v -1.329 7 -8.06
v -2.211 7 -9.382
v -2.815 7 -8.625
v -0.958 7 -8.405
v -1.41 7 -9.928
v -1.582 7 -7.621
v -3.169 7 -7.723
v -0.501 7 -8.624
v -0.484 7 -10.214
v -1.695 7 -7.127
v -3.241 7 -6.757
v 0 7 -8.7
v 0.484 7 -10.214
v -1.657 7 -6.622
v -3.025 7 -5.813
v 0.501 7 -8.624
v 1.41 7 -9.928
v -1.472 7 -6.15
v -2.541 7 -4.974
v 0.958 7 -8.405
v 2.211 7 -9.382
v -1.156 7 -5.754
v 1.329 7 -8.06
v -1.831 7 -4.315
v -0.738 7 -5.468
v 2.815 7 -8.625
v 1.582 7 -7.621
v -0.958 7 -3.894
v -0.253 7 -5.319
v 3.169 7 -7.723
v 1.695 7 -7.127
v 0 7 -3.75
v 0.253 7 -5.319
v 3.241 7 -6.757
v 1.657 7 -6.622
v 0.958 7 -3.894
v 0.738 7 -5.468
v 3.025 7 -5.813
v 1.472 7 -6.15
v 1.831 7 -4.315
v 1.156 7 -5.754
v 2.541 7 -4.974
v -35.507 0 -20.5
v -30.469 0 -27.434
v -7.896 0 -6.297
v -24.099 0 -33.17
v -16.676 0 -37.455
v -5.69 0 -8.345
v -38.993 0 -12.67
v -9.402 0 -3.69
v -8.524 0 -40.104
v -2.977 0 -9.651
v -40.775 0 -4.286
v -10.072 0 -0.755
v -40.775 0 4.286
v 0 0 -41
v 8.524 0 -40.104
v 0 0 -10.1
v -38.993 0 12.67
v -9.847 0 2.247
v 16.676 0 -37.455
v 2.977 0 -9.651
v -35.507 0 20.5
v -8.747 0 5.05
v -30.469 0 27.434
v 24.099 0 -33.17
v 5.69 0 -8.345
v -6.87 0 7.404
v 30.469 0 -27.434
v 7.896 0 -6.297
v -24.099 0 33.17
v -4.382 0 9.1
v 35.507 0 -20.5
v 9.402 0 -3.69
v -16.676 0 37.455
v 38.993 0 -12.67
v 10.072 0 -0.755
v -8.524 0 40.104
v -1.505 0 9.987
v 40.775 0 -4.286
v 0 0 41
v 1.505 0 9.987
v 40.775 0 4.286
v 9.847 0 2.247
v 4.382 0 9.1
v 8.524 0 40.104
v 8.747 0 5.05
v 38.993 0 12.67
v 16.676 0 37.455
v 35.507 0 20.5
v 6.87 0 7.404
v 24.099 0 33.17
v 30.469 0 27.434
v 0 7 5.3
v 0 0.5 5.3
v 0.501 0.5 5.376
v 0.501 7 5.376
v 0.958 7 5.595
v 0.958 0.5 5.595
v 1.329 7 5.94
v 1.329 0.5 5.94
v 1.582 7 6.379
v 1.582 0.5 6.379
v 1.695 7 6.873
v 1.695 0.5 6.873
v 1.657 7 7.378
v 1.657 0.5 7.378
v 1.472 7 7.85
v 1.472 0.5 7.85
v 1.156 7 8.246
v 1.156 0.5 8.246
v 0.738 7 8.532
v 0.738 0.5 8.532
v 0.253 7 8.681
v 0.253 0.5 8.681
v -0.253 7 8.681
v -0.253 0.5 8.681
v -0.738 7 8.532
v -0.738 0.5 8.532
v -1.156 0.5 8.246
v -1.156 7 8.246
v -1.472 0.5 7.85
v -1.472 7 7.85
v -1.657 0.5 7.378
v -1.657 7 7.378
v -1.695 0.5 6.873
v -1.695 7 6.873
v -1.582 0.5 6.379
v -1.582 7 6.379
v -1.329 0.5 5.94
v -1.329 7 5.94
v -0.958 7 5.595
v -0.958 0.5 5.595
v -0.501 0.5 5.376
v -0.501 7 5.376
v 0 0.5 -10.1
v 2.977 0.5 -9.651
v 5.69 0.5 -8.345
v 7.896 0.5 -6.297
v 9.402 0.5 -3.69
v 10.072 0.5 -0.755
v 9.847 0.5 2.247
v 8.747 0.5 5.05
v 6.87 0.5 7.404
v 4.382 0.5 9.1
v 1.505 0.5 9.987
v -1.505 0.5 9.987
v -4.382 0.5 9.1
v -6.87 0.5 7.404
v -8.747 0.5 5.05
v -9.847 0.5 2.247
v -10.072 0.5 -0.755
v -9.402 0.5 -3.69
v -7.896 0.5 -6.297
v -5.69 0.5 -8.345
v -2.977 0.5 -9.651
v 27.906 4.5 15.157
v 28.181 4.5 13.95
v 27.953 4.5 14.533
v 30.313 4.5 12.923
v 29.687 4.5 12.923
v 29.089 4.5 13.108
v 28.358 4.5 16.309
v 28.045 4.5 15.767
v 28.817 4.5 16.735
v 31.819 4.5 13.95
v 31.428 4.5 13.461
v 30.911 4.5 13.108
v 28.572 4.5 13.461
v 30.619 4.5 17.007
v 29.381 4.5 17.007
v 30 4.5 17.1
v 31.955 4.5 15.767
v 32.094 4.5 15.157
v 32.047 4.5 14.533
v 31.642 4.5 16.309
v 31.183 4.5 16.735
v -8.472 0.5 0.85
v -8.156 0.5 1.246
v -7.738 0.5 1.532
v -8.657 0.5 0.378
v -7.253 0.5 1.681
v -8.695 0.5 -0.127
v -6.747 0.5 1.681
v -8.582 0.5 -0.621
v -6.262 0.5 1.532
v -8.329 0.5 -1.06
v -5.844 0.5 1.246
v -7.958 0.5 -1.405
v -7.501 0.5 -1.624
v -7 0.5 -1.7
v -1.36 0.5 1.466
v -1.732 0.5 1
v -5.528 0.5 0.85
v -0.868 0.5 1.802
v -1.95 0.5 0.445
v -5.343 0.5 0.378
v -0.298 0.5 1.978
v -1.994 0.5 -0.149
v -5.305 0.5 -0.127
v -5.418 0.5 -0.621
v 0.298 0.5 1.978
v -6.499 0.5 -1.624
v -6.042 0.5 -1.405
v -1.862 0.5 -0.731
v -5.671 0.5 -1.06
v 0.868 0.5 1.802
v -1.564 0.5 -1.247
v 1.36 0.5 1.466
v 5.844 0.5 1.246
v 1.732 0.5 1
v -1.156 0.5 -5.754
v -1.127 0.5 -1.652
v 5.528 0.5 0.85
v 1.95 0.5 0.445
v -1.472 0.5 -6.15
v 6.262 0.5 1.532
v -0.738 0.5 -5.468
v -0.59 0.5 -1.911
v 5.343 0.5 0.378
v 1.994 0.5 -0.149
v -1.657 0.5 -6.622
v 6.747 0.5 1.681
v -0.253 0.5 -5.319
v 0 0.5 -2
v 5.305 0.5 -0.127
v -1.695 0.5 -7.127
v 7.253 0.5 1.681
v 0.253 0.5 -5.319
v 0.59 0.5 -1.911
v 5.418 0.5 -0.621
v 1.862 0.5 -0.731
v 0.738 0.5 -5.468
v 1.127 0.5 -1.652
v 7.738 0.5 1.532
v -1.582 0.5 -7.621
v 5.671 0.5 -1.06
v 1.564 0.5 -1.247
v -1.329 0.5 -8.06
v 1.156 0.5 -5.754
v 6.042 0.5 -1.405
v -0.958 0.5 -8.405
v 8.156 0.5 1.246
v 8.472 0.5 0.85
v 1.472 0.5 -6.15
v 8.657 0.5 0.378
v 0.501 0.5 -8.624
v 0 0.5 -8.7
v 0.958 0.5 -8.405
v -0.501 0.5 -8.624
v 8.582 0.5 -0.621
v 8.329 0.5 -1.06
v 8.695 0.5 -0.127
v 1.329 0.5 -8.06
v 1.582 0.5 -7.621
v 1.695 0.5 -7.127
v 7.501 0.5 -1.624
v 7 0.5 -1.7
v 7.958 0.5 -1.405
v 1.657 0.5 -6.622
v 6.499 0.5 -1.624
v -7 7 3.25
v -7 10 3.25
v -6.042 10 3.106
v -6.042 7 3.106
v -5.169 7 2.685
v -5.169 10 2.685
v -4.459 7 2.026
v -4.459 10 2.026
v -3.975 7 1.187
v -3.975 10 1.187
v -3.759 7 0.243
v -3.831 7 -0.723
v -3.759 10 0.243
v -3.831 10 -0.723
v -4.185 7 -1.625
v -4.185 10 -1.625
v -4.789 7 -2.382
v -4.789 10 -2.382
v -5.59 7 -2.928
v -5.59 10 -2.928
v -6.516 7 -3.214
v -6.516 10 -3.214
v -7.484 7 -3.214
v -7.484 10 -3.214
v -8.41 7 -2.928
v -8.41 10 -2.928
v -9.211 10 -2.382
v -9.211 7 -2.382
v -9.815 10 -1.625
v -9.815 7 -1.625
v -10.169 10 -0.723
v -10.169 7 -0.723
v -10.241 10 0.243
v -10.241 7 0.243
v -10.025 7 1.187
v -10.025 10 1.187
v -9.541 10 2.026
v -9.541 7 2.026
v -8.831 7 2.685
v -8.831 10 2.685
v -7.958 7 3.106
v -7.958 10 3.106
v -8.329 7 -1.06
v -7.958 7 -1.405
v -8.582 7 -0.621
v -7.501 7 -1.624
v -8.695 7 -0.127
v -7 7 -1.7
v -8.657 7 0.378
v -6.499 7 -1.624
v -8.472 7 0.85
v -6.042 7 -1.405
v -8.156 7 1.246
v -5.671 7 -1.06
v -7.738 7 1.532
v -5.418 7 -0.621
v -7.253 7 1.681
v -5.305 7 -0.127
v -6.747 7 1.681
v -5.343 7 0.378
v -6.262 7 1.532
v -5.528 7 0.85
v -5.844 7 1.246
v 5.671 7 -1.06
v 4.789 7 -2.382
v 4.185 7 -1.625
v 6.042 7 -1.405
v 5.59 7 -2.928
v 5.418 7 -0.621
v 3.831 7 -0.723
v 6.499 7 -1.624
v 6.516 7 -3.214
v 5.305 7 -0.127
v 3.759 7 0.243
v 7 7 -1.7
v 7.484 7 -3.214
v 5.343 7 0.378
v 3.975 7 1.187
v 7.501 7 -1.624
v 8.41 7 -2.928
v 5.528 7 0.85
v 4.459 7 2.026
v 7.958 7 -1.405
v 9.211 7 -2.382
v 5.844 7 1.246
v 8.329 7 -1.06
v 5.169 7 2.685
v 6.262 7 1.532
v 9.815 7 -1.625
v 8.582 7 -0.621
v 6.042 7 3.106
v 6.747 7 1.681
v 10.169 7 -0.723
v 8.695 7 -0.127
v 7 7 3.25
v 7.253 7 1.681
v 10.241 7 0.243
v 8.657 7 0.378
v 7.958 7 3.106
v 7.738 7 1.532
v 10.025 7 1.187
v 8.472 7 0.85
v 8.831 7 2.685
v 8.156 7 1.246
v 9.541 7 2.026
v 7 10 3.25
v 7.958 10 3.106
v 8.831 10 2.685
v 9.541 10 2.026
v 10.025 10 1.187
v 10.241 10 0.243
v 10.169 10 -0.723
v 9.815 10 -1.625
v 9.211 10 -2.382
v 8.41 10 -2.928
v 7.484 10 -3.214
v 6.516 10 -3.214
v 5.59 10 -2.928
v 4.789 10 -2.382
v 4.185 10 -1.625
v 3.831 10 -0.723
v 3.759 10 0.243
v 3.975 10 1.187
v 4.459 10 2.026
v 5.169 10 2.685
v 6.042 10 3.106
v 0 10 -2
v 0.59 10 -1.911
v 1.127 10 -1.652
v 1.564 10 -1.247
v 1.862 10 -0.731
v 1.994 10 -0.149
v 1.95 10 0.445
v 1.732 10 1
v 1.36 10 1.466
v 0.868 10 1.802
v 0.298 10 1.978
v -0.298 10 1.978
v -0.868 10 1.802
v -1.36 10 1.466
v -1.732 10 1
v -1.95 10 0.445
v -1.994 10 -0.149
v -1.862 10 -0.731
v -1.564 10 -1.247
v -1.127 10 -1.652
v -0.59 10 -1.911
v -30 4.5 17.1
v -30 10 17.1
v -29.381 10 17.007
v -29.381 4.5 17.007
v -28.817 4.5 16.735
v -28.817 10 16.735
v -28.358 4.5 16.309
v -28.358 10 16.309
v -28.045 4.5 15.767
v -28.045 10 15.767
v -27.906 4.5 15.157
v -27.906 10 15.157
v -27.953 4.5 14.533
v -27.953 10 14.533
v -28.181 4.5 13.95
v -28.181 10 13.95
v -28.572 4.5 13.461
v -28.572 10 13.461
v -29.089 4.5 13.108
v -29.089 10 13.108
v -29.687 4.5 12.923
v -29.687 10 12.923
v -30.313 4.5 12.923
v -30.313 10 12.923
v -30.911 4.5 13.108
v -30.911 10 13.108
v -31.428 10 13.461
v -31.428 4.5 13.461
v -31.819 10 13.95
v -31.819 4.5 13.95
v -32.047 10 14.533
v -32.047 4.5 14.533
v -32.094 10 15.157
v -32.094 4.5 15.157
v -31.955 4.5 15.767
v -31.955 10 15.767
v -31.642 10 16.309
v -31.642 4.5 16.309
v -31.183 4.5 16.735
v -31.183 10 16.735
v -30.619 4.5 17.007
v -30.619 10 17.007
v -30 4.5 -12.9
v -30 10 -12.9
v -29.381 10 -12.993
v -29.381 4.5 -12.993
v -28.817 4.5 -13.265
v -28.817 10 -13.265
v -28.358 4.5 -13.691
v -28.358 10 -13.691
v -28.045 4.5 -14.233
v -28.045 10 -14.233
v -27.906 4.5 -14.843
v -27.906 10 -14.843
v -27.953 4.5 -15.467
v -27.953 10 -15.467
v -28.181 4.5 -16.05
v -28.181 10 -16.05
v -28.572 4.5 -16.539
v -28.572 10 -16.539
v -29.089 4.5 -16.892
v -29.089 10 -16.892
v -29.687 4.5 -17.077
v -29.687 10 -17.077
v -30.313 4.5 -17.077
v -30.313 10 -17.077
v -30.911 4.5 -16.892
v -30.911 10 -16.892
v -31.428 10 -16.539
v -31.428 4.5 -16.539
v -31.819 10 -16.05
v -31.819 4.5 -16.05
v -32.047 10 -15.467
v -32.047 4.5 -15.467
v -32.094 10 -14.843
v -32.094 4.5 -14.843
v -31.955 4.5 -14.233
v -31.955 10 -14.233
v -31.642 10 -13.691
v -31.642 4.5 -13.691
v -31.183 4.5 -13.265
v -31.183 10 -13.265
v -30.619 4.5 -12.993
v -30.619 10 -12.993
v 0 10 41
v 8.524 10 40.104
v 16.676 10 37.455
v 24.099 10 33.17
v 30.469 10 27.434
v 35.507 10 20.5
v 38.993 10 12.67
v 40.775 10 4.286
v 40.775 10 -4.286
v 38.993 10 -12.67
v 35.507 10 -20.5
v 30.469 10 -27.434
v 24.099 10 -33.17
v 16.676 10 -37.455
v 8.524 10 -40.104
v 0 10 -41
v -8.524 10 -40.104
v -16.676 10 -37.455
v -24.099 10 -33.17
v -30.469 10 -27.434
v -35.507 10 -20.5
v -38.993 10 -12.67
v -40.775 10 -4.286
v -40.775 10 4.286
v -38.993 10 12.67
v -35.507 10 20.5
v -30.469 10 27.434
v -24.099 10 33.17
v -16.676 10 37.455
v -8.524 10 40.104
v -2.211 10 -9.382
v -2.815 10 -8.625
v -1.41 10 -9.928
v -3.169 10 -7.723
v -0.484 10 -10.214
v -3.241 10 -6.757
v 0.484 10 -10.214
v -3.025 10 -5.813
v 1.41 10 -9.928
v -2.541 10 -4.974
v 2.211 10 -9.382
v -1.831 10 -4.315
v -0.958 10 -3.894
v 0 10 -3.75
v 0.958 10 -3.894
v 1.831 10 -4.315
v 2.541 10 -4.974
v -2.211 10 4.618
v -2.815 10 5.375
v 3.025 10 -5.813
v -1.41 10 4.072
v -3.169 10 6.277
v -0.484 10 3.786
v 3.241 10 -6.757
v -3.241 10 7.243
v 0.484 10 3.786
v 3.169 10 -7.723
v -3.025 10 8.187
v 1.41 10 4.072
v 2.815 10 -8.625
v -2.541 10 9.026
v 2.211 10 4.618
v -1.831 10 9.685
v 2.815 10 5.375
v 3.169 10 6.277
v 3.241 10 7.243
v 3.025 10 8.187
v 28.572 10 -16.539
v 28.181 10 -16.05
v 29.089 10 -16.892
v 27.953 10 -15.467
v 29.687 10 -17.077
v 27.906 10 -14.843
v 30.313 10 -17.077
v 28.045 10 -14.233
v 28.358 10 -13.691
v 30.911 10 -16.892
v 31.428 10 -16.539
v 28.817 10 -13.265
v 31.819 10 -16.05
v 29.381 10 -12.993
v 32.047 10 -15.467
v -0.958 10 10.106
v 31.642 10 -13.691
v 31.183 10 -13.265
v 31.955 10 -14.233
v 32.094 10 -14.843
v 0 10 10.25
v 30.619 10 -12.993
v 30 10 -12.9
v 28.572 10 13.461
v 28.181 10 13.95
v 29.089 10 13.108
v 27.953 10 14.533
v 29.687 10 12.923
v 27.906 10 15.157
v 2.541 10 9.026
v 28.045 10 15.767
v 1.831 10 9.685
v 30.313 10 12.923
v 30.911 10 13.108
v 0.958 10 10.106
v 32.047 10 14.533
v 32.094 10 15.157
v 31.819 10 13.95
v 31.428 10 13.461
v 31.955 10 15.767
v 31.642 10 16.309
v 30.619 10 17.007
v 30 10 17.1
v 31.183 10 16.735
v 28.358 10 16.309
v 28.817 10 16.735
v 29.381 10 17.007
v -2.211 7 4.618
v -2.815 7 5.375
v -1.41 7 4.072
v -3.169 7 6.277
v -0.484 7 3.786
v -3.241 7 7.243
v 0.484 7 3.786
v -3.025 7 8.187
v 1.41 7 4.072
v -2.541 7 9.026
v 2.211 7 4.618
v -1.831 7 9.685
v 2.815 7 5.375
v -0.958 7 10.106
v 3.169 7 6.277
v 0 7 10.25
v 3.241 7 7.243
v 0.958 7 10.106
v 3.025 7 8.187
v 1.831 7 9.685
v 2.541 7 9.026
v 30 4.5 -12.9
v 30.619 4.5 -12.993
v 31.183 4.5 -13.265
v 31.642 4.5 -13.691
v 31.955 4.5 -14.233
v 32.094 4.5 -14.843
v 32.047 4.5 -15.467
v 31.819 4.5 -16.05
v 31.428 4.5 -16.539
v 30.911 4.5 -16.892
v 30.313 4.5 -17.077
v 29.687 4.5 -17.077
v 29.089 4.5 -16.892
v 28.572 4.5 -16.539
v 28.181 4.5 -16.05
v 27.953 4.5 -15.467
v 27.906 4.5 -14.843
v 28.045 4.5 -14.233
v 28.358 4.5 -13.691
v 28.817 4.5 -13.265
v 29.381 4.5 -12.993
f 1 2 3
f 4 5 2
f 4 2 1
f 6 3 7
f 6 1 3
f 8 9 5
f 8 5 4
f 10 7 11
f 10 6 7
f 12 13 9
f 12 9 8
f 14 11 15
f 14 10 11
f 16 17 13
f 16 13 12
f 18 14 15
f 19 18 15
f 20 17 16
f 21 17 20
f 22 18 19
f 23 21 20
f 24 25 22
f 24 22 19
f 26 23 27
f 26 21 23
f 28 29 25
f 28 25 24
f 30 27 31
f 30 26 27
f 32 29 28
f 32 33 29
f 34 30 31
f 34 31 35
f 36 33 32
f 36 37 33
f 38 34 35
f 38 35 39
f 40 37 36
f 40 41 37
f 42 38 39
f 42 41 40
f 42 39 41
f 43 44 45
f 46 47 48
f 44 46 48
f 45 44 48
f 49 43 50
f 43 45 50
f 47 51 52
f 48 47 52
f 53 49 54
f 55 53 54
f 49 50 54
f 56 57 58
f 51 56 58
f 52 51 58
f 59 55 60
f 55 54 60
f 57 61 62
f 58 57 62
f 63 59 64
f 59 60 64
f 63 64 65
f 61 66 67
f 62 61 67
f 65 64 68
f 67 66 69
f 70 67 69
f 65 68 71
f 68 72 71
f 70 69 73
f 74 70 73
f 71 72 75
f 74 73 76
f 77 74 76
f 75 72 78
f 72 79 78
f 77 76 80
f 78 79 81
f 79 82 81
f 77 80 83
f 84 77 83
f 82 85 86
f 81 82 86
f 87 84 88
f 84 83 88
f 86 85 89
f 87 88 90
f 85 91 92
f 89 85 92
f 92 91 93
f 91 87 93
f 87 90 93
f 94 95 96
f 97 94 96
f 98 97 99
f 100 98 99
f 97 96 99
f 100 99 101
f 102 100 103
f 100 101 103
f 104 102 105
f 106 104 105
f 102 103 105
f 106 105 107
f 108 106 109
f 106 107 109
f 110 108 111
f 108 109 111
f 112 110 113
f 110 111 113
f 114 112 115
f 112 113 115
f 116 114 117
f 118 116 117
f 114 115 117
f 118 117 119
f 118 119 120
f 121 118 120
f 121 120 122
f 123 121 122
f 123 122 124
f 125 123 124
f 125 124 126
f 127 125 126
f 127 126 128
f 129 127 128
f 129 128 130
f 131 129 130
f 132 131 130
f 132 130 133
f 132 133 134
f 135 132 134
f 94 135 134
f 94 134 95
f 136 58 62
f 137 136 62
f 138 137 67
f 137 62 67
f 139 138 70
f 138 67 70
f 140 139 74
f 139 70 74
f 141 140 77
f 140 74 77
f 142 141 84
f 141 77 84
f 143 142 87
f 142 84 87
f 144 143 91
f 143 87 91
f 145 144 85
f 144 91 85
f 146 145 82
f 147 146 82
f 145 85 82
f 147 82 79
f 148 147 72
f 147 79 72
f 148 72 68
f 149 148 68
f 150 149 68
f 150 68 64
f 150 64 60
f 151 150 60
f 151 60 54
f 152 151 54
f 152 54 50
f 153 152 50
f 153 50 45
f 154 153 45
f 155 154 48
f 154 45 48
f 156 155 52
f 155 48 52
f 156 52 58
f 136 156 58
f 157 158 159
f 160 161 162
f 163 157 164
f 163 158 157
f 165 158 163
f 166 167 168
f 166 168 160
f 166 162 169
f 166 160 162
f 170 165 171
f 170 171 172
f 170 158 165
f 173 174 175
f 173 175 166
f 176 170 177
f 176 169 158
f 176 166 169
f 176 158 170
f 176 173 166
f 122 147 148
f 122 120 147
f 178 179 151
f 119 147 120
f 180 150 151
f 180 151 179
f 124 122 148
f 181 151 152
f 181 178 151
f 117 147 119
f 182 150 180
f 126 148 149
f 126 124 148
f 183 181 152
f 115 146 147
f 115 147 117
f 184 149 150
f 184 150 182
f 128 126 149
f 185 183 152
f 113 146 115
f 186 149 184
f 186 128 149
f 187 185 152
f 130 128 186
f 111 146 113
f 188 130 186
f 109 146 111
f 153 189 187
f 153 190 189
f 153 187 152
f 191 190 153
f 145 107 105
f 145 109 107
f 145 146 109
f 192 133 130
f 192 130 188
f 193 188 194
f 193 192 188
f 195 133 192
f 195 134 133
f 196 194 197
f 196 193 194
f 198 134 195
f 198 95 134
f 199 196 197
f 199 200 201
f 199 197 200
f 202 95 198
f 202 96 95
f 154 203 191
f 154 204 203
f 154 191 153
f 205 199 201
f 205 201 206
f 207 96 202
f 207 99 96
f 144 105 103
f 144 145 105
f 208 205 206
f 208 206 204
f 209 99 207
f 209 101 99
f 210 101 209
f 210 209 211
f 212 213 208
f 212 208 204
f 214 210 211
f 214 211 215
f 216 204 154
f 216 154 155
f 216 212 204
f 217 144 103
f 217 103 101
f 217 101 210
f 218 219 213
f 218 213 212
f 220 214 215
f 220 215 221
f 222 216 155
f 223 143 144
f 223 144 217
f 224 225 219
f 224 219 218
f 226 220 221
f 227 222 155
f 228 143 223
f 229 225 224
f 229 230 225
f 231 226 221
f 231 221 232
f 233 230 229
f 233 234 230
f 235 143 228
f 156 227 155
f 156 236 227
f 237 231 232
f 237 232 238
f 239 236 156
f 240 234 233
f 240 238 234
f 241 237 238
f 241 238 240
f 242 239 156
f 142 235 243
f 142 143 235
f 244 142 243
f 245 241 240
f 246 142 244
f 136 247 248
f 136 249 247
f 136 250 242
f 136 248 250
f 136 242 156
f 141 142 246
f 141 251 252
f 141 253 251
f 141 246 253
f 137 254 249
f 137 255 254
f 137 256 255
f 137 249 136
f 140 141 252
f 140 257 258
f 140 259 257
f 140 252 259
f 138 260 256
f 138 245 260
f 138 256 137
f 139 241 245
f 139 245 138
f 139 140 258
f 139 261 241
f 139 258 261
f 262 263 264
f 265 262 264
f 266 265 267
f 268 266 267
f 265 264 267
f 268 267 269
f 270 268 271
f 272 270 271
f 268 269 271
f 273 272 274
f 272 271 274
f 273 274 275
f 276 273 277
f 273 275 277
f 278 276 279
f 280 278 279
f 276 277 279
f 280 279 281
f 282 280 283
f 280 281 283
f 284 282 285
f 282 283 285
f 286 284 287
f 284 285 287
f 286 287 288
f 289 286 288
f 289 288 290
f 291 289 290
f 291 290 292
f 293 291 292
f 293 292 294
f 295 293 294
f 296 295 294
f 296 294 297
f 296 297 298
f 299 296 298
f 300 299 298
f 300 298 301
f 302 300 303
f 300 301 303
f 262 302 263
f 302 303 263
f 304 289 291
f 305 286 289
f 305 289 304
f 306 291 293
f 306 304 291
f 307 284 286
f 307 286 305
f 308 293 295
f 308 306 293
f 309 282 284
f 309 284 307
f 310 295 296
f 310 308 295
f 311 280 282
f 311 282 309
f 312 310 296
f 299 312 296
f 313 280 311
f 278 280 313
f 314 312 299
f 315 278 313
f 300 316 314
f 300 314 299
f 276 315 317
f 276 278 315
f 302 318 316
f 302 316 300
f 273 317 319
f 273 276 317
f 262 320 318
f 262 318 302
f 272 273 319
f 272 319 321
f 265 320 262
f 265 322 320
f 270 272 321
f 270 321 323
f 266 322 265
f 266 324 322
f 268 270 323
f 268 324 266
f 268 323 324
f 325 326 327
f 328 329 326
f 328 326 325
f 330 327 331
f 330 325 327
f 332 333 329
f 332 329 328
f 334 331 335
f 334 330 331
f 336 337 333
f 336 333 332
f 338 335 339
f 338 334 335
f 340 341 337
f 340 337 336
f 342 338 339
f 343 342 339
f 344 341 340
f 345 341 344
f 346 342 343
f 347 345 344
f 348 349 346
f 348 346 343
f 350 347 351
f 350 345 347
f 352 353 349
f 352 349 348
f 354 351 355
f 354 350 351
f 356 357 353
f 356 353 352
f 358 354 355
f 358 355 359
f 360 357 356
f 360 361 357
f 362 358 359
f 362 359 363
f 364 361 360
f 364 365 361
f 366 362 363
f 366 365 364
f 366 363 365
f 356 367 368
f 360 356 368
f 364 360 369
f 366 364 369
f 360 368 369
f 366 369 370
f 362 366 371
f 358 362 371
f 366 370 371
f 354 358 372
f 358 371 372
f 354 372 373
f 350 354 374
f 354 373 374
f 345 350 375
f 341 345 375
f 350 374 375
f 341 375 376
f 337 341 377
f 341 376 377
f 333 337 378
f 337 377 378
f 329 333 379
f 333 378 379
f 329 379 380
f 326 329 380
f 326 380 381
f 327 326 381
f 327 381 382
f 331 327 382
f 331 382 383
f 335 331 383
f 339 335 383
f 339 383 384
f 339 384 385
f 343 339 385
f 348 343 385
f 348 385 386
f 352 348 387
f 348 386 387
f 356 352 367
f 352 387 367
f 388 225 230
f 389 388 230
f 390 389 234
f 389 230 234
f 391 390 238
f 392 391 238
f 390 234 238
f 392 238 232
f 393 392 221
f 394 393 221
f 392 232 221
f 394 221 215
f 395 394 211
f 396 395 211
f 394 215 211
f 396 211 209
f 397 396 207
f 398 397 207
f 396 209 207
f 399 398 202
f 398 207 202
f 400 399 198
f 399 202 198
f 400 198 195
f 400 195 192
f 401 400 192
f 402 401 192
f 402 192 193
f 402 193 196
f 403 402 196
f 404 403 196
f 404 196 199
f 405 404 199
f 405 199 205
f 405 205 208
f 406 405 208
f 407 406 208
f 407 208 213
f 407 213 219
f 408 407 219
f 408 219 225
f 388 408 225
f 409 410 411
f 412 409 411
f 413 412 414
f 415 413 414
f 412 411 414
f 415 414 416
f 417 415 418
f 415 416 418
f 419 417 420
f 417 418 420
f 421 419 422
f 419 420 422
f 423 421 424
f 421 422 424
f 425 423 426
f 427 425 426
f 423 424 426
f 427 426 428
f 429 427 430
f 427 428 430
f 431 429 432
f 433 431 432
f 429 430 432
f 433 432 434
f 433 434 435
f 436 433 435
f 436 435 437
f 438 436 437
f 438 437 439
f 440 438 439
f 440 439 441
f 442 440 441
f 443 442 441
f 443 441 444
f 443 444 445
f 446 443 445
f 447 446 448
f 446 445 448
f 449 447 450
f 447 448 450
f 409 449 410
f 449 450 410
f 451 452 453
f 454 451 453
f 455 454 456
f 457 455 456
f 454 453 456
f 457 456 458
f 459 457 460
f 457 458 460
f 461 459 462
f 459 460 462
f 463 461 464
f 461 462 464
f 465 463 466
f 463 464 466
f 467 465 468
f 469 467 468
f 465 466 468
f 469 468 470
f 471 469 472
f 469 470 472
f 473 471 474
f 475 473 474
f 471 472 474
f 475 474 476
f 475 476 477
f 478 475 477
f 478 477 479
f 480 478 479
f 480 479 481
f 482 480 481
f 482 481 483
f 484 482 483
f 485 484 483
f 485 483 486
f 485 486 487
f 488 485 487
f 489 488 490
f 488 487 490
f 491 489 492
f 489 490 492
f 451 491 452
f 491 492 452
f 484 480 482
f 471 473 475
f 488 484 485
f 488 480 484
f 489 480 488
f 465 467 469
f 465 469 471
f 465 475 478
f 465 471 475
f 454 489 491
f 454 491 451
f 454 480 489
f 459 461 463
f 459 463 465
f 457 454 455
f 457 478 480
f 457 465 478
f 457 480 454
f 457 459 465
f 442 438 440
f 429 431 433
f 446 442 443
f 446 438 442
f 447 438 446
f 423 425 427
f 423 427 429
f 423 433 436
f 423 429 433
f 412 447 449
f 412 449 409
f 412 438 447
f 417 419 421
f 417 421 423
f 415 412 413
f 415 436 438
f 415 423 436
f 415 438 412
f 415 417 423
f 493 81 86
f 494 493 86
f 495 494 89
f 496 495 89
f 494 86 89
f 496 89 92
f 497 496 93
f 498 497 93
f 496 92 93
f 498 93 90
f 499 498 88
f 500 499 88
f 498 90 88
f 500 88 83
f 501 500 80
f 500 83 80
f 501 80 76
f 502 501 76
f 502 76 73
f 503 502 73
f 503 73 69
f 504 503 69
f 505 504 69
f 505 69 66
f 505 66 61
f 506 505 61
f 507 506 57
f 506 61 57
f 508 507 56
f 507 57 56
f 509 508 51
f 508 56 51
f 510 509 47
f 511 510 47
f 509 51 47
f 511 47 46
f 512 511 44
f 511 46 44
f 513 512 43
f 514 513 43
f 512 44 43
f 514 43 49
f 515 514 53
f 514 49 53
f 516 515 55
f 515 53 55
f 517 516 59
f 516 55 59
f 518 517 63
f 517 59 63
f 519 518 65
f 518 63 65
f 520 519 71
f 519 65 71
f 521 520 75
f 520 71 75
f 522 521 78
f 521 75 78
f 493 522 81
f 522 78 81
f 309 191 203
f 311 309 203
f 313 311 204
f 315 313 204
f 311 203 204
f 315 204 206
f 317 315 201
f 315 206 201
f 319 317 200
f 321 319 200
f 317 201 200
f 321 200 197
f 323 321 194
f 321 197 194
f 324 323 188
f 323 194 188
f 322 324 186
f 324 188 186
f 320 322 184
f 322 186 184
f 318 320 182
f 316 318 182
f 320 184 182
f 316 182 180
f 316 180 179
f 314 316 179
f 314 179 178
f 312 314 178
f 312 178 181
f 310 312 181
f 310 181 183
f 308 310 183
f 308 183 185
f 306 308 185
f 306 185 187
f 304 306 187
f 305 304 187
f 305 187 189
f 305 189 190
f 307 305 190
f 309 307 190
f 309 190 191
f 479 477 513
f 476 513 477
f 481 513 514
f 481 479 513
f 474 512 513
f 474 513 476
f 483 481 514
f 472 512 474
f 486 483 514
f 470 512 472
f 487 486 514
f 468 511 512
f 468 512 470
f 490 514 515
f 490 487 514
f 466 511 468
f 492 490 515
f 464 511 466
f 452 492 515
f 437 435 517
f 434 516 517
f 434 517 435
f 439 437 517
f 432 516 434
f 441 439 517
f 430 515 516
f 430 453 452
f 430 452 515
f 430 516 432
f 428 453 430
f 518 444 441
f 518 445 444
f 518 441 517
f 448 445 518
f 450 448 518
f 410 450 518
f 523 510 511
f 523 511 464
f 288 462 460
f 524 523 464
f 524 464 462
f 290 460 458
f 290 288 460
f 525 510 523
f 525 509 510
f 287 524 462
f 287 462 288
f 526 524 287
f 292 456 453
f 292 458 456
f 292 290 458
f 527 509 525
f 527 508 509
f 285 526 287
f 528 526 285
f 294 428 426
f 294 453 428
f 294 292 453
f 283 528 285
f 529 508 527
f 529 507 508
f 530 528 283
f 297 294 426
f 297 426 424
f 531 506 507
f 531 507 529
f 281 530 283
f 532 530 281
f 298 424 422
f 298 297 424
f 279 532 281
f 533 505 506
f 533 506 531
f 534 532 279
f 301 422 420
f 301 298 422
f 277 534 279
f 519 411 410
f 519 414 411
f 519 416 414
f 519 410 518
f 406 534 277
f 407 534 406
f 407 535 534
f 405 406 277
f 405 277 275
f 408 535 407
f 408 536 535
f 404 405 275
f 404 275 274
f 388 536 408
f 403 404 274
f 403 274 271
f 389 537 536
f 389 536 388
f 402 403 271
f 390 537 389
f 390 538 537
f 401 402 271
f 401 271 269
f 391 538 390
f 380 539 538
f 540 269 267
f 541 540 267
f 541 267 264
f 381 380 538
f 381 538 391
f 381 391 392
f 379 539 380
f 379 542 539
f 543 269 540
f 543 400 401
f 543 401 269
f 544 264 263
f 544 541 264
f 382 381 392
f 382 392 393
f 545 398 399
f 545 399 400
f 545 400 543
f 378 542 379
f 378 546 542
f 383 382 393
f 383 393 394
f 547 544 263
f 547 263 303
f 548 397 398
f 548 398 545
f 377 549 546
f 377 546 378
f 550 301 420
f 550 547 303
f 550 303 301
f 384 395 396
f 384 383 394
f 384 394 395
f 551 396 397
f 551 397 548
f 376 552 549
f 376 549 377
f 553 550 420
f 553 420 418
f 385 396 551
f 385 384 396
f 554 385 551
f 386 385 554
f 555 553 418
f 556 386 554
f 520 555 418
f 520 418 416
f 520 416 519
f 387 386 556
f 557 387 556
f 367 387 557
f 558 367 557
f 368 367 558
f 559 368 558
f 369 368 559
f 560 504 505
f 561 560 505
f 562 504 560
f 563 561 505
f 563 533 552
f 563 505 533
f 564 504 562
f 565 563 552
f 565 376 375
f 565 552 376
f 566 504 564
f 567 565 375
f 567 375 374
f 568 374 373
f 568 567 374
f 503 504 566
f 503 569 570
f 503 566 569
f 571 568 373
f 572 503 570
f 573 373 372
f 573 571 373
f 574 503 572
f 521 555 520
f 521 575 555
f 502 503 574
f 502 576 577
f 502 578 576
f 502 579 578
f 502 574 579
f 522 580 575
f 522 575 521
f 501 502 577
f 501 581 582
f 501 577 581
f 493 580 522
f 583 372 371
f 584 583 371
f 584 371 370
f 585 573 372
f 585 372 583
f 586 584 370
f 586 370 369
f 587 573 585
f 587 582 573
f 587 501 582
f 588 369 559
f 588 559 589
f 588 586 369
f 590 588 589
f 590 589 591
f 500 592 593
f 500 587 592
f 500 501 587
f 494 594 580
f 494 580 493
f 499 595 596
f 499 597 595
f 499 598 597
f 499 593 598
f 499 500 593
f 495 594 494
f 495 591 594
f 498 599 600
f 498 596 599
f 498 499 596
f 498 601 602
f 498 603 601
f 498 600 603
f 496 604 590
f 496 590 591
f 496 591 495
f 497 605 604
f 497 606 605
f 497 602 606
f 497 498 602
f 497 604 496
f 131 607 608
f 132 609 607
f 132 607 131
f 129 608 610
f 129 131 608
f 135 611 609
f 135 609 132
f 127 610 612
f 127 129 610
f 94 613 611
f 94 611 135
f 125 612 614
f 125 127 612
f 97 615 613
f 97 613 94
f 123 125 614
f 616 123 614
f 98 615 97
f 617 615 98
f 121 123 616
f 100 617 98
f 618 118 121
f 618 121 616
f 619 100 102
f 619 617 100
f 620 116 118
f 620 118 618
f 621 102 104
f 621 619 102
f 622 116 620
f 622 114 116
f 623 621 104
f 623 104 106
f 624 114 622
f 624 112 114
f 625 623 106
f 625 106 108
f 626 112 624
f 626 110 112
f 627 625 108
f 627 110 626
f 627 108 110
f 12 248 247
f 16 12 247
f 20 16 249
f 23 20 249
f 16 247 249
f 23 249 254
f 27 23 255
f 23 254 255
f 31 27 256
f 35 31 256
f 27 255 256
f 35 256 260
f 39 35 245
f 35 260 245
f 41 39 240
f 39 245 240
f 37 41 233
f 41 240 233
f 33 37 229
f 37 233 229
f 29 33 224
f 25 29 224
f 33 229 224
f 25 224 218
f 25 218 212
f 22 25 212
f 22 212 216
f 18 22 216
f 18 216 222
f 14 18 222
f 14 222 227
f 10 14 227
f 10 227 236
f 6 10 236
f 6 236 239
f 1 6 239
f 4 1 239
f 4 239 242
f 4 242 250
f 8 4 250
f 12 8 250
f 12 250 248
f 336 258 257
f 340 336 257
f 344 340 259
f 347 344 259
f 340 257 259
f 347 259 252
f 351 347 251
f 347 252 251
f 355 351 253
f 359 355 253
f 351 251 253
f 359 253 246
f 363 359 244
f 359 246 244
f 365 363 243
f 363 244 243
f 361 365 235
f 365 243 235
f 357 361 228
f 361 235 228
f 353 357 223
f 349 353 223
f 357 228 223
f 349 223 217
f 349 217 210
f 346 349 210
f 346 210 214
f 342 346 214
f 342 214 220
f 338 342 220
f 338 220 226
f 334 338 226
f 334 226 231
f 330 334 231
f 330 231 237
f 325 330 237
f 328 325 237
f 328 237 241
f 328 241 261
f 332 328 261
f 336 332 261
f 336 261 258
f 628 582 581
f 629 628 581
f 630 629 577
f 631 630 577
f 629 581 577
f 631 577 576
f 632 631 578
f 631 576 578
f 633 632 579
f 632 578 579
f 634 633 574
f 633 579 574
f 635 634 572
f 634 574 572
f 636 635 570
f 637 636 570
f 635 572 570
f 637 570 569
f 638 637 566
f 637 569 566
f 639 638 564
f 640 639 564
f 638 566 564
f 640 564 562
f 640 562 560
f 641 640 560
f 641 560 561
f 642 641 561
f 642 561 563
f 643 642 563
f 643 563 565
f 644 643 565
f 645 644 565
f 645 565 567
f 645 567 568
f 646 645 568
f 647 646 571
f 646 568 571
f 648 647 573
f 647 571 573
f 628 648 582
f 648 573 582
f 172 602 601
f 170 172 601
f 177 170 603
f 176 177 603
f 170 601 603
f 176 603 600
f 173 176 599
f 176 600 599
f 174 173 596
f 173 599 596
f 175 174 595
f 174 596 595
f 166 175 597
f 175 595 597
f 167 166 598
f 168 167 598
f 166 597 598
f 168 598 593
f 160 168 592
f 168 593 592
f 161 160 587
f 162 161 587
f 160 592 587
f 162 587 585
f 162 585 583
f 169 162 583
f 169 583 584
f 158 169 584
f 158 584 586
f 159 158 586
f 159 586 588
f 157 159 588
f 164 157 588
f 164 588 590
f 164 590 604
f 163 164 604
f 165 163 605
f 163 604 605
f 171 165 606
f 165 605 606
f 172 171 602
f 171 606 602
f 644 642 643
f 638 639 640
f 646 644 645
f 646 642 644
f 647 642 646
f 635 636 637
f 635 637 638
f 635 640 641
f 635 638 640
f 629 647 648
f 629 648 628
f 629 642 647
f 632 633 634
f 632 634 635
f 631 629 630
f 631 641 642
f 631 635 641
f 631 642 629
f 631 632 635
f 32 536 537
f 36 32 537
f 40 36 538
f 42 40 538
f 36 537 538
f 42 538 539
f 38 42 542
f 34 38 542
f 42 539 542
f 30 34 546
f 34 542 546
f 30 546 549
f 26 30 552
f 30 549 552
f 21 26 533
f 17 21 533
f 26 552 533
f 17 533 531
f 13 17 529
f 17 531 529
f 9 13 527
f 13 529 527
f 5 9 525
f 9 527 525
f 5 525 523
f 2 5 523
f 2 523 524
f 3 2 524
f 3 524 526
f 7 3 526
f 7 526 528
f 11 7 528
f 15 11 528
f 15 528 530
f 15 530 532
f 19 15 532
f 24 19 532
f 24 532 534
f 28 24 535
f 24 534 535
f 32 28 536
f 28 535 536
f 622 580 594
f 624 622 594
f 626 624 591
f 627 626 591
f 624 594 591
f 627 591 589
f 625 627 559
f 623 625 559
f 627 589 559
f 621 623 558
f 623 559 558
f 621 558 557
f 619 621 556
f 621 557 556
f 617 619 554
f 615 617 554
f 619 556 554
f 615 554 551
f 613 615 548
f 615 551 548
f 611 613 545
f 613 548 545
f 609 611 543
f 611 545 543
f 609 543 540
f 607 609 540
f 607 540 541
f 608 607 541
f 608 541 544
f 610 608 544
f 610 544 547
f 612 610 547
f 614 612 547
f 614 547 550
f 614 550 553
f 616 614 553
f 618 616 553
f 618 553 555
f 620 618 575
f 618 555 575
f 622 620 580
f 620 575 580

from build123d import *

# Parameters (mm, degrees)
SKETCH1_R           = 41
BOSS_EXTRUDE1_DEPTH = 10
SKETCH2_R           = 10.1
CUT_EXTRUDE1_DEPTH  = 0.5
SKETCH3_R           = 1.7
SKETCH3_R_2         = 2
CUT_EXTRUDE2_DEPTH  = 59.755850772
SKETCH4_R           = 3.25
CUT_EXTRUDE3_DEPTH  = 3
SKETCH5_R           = 2.1
CUT_EXTRUDE4_DEPTH  = 5.5


with BuildPart() as part:
    # Sketch1 → Boss-Extrude1 (new body)
    with BuildSketch(Plane(origin=(0, 0, 0), x_dir=(1, 0, 0), z_dir=(0, 1, 0))):
        with Locations(Location((0, 0, 0), (0, 0, 270))):
            Circle(SKETCH1_R)
    extrude(amount=BOSS_EXTRUDE1_DEPTH)

    # Sketch2 → Cut-Extrude1 (cut)
    with BuildSketch(Plane.XZ):
        with Locations(Location((0, 0, 0), (0, 0, 270))):
            Circle(SKETCH2_R)
    extrude(amount=-CUT_EXTRUDE1_DEPTH, mode=Mode.SUBTRACT)

    # Sketch3 → Cut-Extrude2 (cut, through all)
    with BuildSketch(Plane.XZ.offset(-0.5)):
        with Locations(Location((0, 7, 0), (0, 0, 270))):
            Circle(SKETCH3_R)
        with Locations(Location((7, 0, 0), (0, 0, 270))):
            Circle(SKETCH3_R)
        with Locations(Location((0, -7, 0), (0, 0, 270))):
            Circle(SKETCH3_R)
        with Locations(Location((-7, 0, 0), (0, 0, 270))):
            Circle(SKETCH3_R)
        with Locations(Location((0, 0, 0), (0, 0, 270))):
            Circle(SKETCH3_R_2)
    extrude(amount=-CUT_EXTRUDE2_DEPTH, mode=Mode.SUBTRACT)

    # Sketch4 → Cut-Extrude3 (cut)
    with BuildSketch(Plane(origin=(0, 10, 0), x_dir=(1, 0, 0), z_dir=(0, 1, 0))):
        with Locations(Location((0, 7, 0), (0, 0, 270))):
            Circle(SKETCH4_R)
        with Locations(Location((7, 0, 0), (0, 0, 270))):
            Circle(SKETCH4_R)
        with Locations(Location((0, -7, 0), (0, 0, 270))):
            Circle(SKETCH4_R)
        with Locations(Location((-7, 0, 0), (0, 0, 270))):
            Circle(SKETCH4_R)
    extrude(amount=-CUT_EXTRUDE3_DEPTH, mode=Mode.SUBTRACT)

    # Sketch5 → Cut-Extrude4 (cut)
    with BuildSketch(Plane(origin=(0, 10, 0), x_dir=(1, 0, 0), z_dir=(0, 1, 0))):
        with Locations(Location((-30, 15, 0), (0, 0, 270))):
            Circle(SKETCH5_R)
        with Locations(Location((-30, -15, 0), (0, 0, 270))):
            Circle(SKETCH5_R)
        with Locations(Location((30, 15, 0), (0, 0, 270))):
            Circle(SKETCH5_R)
        with Locations(Location((30, -15, 0), (0, 0, 270))):
            Circle(SKETCH5_R)
    extrude(amount=-CUT_EXTRUDE4_DEPTH, mode=Mode.SUBTRACT)


solid = part.part
